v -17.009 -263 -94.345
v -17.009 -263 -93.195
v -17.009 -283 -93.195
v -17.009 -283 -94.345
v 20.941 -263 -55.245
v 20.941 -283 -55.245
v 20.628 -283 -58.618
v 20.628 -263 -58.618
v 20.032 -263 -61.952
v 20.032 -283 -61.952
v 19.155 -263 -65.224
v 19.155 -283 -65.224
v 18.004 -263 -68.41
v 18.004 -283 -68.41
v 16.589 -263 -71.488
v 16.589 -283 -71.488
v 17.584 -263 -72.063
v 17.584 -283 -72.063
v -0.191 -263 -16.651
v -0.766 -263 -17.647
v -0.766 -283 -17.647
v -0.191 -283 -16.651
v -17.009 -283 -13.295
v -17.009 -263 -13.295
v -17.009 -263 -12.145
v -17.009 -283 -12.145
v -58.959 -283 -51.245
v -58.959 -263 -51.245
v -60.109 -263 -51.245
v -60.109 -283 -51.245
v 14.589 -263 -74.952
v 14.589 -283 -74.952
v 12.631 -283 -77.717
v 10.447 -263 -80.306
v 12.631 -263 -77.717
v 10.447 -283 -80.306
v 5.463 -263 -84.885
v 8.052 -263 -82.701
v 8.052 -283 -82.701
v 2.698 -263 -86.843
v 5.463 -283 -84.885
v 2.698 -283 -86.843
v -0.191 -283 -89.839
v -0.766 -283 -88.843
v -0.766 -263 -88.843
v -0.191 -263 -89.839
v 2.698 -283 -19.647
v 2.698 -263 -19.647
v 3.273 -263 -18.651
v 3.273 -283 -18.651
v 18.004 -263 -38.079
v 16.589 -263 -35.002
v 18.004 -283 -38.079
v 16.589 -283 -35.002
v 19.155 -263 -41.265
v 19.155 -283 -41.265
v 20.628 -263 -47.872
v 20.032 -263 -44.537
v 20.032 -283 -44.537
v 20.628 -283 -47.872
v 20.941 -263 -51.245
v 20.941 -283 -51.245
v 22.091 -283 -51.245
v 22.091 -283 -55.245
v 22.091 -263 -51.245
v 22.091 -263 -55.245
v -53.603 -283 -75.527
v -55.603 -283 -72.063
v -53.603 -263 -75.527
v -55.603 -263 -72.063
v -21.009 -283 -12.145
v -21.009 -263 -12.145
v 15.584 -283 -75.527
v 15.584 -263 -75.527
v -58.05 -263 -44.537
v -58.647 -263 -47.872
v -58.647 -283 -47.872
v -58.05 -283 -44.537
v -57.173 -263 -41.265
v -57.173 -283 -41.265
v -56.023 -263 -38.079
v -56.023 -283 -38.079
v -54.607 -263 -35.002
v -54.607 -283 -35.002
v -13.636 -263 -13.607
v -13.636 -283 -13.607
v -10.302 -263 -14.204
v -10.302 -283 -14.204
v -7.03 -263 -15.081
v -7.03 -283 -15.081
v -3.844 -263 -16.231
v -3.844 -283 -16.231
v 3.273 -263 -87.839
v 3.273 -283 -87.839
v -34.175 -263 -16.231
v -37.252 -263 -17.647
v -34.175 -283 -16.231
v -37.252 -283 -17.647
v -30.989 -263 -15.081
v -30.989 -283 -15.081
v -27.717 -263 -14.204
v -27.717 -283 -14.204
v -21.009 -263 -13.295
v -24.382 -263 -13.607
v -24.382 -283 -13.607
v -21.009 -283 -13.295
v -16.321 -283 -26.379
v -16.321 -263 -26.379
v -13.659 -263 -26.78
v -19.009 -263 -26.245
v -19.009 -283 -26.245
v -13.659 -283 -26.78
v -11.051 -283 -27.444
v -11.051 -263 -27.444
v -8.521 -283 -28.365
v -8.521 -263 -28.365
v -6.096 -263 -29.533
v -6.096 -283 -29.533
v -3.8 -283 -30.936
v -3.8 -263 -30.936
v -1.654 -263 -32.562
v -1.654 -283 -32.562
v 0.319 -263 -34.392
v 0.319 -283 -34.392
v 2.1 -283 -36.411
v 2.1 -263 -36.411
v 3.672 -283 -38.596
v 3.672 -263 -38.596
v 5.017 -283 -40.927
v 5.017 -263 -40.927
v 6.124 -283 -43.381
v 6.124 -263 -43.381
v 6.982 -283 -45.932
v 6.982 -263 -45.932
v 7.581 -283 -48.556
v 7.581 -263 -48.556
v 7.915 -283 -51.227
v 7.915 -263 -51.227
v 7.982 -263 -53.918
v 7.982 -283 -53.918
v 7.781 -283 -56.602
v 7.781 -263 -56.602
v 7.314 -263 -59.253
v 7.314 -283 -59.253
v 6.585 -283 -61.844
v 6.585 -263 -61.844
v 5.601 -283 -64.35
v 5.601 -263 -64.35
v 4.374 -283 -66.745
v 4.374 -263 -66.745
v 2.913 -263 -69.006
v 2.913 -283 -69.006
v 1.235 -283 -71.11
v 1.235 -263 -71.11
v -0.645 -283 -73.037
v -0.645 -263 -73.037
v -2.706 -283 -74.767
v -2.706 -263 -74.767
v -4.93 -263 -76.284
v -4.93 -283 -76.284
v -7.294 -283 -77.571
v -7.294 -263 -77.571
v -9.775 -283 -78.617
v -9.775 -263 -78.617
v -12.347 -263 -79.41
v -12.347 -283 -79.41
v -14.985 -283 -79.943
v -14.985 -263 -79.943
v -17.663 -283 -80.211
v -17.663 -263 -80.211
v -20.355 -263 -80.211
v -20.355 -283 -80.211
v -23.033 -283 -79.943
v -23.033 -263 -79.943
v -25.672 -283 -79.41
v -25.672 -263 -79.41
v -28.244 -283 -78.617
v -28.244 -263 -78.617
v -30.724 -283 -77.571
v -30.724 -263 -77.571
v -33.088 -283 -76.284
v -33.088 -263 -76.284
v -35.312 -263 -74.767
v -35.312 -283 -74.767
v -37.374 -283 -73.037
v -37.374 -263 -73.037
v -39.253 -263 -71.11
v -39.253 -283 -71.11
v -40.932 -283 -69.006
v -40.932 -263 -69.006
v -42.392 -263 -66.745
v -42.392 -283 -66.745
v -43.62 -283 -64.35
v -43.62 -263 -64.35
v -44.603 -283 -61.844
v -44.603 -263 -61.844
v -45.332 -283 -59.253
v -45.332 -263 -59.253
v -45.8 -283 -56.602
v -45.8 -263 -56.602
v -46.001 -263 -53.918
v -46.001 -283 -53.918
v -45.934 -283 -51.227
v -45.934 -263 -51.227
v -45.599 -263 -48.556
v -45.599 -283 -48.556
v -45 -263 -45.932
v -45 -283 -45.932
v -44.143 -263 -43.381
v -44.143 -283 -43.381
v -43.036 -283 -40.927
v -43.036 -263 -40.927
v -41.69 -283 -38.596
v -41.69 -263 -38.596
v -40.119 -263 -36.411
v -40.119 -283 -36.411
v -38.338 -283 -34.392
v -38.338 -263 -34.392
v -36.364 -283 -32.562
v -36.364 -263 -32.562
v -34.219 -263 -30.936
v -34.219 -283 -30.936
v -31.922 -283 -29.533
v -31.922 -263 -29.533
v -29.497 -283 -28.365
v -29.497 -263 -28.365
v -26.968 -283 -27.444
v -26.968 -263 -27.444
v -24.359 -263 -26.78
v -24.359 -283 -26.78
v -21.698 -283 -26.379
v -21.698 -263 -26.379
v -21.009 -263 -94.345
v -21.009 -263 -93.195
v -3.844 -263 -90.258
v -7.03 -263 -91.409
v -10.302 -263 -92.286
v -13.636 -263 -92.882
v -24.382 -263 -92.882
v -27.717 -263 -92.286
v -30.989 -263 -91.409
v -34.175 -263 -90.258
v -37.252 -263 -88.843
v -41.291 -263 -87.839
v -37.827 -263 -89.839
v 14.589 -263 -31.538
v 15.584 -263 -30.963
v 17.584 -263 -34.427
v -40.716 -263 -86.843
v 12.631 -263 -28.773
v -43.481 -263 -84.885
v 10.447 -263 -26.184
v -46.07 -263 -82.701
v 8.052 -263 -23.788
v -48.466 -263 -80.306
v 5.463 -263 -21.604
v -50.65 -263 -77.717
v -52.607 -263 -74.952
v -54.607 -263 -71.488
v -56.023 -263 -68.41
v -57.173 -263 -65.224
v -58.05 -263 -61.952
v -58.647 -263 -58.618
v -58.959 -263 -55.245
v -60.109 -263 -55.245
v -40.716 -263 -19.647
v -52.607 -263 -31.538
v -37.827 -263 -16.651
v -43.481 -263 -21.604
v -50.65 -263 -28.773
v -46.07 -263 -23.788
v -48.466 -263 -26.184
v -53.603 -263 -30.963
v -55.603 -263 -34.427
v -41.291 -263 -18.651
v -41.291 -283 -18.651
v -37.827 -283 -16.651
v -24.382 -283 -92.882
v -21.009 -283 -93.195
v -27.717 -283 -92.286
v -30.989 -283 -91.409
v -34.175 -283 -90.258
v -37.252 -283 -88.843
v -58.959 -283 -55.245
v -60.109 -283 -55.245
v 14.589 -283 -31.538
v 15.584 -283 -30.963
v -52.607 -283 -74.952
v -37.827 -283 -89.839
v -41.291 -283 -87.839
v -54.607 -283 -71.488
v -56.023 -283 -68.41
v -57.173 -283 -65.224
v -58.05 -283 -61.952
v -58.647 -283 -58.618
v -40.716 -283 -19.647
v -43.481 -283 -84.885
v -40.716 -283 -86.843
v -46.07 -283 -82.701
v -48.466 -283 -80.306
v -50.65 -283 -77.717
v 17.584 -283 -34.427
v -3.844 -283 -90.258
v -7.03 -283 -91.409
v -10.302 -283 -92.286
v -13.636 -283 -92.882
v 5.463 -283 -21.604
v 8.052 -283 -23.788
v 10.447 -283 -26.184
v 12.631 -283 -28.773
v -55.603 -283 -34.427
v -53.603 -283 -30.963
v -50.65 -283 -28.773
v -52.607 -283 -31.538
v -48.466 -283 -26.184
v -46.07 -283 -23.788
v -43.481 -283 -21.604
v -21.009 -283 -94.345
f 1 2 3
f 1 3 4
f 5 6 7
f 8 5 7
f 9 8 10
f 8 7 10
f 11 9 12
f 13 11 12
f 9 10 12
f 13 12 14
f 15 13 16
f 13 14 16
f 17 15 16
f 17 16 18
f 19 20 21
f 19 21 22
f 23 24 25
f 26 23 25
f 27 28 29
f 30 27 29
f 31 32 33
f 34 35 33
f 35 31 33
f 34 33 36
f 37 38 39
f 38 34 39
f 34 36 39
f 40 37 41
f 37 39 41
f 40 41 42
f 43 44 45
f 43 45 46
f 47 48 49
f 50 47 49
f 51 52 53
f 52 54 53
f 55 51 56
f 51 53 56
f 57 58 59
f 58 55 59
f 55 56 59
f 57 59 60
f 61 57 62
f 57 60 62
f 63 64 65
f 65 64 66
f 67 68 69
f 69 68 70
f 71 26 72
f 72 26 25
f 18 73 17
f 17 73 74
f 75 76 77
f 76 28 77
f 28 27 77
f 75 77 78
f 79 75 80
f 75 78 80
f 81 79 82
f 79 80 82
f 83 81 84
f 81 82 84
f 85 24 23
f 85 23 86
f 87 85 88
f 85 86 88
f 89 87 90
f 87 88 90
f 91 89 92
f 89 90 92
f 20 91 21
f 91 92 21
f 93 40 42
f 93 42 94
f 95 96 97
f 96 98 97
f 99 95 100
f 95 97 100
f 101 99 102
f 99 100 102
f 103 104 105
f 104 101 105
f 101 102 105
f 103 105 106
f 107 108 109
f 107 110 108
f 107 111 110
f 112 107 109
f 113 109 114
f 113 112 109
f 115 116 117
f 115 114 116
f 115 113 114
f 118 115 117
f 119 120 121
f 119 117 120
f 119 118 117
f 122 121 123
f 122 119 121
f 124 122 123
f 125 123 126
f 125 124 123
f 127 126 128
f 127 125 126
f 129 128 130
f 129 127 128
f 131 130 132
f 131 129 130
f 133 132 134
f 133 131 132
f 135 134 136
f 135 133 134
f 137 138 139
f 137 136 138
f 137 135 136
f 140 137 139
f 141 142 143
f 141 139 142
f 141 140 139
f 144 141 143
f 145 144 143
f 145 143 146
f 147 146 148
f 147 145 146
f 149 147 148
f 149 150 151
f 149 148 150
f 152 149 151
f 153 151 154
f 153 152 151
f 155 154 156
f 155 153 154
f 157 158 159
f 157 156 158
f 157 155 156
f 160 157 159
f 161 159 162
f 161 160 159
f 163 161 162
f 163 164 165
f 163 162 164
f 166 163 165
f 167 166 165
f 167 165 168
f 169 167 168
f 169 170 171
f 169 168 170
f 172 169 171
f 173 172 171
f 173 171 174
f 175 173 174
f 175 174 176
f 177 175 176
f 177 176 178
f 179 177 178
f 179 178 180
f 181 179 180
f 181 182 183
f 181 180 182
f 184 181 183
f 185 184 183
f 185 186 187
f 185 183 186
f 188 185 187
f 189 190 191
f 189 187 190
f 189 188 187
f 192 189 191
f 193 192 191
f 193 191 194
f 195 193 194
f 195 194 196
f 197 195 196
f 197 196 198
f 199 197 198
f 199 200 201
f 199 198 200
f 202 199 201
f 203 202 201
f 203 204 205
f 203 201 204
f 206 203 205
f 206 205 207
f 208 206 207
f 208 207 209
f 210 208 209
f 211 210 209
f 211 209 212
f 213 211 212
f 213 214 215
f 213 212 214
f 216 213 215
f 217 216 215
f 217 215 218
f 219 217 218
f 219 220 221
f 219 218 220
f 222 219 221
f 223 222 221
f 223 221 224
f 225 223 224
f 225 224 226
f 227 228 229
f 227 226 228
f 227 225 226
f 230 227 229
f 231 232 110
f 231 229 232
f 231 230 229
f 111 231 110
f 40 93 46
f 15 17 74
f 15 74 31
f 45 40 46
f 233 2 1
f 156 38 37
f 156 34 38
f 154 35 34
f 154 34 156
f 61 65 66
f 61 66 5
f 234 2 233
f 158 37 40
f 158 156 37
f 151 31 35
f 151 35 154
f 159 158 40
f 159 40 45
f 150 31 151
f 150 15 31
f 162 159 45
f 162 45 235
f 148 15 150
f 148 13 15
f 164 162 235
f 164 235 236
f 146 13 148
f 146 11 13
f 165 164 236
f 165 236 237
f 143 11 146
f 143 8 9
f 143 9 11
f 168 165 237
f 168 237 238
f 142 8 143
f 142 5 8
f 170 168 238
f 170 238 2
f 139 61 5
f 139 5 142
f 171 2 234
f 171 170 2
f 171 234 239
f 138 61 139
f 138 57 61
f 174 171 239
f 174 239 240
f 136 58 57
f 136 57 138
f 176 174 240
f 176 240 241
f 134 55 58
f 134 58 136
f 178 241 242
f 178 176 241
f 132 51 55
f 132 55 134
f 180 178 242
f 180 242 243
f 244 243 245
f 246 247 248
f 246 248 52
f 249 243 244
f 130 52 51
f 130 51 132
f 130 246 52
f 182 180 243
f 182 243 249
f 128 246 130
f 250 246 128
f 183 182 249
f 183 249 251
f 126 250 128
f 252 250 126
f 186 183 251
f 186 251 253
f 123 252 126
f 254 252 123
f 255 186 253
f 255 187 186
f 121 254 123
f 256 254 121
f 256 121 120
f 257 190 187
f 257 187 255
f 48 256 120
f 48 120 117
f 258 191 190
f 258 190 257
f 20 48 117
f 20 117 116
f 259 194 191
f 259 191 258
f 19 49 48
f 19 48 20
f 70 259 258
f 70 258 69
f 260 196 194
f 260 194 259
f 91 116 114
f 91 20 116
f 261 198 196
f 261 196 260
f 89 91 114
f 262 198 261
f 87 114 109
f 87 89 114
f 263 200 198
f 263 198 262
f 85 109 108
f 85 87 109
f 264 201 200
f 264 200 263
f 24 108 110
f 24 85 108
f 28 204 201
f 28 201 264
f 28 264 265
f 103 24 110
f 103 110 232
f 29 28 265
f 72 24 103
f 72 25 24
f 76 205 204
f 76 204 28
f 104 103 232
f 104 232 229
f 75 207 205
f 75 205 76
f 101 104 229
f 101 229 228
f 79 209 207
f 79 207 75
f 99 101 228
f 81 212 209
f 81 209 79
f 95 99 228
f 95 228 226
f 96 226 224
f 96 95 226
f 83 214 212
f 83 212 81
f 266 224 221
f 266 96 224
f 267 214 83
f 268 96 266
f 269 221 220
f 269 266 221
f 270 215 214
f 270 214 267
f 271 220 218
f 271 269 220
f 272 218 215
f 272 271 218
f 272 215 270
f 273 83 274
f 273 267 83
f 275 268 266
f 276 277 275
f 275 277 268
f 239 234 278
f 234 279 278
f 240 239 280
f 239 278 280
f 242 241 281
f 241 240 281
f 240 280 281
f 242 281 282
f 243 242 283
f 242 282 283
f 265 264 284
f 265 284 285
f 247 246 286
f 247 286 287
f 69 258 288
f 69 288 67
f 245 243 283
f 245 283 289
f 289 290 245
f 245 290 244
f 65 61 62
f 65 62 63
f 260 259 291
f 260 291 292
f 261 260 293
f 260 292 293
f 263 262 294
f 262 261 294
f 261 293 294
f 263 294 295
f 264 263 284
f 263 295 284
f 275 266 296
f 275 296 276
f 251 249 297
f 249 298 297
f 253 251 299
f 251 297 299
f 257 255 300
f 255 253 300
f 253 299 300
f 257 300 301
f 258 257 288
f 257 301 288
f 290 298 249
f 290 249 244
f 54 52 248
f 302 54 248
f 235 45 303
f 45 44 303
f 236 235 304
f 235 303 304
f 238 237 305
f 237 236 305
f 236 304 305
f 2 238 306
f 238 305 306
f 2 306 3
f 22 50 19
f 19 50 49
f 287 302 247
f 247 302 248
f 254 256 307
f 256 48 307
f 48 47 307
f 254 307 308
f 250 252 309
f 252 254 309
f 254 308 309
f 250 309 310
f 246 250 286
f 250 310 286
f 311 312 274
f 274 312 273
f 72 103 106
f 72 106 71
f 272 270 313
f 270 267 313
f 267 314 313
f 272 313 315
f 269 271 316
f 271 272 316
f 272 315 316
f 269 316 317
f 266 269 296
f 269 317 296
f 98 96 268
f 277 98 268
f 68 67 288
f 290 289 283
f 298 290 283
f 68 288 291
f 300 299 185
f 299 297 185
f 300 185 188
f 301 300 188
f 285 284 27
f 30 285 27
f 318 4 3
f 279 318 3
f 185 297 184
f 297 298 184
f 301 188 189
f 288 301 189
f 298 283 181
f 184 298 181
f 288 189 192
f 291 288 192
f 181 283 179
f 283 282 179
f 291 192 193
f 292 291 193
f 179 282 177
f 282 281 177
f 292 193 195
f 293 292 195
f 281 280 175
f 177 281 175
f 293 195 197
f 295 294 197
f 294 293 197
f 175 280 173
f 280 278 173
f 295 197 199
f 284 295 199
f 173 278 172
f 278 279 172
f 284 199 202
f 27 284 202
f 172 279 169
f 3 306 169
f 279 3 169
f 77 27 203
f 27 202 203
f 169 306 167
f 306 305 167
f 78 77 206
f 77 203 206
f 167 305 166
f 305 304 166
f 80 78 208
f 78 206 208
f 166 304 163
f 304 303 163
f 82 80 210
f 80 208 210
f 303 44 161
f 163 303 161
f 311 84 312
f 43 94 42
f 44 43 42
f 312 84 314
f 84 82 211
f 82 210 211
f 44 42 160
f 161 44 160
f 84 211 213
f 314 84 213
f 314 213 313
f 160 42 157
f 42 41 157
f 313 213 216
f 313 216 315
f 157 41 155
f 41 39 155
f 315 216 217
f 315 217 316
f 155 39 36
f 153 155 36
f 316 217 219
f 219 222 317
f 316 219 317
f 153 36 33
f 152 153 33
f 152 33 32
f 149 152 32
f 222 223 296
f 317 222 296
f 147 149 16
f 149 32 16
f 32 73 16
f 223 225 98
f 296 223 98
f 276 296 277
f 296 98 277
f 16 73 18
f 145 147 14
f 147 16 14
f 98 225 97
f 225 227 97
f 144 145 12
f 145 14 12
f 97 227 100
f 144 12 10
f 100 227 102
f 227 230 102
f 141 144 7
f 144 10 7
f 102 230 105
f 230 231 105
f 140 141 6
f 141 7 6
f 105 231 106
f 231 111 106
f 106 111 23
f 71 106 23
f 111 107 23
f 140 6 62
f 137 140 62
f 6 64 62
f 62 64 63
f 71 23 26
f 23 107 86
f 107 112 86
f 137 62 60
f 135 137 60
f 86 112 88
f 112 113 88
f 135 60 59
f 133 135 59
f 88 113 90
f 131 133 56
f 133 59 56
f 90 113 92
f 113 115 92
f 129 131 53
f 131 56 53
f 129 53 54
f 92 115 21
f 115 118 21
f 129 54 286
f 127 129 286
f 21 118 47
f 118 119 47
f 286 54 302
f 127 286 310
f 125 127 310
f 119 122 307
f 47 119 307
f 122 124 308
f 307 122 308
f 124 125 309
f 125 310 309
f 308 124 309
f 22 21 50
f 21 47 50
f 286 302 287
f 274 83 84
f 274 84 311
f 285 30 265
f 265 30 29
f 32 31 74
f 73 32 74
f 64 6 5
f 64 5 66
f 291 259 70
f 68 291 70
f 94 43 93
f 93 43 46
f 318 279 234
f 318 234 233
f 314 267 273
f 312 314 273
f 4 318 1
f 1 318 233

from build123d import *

# Parameters (mm, degrees)
TYRE_BASE_SKETCH_R     = 40
TYRE_BASE_DEPTH        = 20
RIM_BORE_SKETCH_R      = 27
RIM_BORE_DEPTH         = 20.2
TREAD_RIB_SKETCH_W     = 3.2
TREAD_RIB_SKETCH_H     = 20
TREAD_RIB_DEPTH        = 4
CIRCULARPATTERN1_COUNT = 12


with BuildPart() as part:
    # Tyre base sketch → Tyre base (new body)
    with BuildSketch(Plane(origin=(0, -283, 0), x_dir=(1, 0, 0), z_dir=(0, 1, 0))):
        with Locations((-19.009182883, 53.244882879)):
            Circle(TYRE_BASE_SKETCH_R)
    extrude(amount=TYRE_BASE_DEPTH)

    # Rim bore sketch → Rim bore (cut)
    with BuildSketch(Plane(origin=(0, -283.1, 0), x_dir=(1, 0, 0), z_dir=(0, 1, 0))):
        with Locations((-19.009182883, 53.244882879)):
            Circle(RIM_BORE_SKETCH_R)
    extrude(amount=RIM_BORE_DEPTH, mode=Mode.SUBTRACT)

    # Tread rib sketch → Tread rib (add)
    with BuildSketch(Plane.XY.offset(-55.244882879)):
        with Locations((20.490817117, -273)):
            Rectangle(TREAD_RIB_SKETCH_W, TREAD_RIB_SKETCH_H)
    tread_rib = extrude(amount=TREAD_RIB_DEPTH)

    # CircularPattern1: Tread rib ×12 about axis
    circularpattern1_axis = Axis((-19.009182883, -10, -53.244882879), (0, 1, 0))
    for i in range(1, CIRCULARPATTERN1_COUNT):
        add(tread_rib.rotate(circularpattern1_axis, i * 360 / CIRCULARPATTERN1_COUNT))


solid = part.part
